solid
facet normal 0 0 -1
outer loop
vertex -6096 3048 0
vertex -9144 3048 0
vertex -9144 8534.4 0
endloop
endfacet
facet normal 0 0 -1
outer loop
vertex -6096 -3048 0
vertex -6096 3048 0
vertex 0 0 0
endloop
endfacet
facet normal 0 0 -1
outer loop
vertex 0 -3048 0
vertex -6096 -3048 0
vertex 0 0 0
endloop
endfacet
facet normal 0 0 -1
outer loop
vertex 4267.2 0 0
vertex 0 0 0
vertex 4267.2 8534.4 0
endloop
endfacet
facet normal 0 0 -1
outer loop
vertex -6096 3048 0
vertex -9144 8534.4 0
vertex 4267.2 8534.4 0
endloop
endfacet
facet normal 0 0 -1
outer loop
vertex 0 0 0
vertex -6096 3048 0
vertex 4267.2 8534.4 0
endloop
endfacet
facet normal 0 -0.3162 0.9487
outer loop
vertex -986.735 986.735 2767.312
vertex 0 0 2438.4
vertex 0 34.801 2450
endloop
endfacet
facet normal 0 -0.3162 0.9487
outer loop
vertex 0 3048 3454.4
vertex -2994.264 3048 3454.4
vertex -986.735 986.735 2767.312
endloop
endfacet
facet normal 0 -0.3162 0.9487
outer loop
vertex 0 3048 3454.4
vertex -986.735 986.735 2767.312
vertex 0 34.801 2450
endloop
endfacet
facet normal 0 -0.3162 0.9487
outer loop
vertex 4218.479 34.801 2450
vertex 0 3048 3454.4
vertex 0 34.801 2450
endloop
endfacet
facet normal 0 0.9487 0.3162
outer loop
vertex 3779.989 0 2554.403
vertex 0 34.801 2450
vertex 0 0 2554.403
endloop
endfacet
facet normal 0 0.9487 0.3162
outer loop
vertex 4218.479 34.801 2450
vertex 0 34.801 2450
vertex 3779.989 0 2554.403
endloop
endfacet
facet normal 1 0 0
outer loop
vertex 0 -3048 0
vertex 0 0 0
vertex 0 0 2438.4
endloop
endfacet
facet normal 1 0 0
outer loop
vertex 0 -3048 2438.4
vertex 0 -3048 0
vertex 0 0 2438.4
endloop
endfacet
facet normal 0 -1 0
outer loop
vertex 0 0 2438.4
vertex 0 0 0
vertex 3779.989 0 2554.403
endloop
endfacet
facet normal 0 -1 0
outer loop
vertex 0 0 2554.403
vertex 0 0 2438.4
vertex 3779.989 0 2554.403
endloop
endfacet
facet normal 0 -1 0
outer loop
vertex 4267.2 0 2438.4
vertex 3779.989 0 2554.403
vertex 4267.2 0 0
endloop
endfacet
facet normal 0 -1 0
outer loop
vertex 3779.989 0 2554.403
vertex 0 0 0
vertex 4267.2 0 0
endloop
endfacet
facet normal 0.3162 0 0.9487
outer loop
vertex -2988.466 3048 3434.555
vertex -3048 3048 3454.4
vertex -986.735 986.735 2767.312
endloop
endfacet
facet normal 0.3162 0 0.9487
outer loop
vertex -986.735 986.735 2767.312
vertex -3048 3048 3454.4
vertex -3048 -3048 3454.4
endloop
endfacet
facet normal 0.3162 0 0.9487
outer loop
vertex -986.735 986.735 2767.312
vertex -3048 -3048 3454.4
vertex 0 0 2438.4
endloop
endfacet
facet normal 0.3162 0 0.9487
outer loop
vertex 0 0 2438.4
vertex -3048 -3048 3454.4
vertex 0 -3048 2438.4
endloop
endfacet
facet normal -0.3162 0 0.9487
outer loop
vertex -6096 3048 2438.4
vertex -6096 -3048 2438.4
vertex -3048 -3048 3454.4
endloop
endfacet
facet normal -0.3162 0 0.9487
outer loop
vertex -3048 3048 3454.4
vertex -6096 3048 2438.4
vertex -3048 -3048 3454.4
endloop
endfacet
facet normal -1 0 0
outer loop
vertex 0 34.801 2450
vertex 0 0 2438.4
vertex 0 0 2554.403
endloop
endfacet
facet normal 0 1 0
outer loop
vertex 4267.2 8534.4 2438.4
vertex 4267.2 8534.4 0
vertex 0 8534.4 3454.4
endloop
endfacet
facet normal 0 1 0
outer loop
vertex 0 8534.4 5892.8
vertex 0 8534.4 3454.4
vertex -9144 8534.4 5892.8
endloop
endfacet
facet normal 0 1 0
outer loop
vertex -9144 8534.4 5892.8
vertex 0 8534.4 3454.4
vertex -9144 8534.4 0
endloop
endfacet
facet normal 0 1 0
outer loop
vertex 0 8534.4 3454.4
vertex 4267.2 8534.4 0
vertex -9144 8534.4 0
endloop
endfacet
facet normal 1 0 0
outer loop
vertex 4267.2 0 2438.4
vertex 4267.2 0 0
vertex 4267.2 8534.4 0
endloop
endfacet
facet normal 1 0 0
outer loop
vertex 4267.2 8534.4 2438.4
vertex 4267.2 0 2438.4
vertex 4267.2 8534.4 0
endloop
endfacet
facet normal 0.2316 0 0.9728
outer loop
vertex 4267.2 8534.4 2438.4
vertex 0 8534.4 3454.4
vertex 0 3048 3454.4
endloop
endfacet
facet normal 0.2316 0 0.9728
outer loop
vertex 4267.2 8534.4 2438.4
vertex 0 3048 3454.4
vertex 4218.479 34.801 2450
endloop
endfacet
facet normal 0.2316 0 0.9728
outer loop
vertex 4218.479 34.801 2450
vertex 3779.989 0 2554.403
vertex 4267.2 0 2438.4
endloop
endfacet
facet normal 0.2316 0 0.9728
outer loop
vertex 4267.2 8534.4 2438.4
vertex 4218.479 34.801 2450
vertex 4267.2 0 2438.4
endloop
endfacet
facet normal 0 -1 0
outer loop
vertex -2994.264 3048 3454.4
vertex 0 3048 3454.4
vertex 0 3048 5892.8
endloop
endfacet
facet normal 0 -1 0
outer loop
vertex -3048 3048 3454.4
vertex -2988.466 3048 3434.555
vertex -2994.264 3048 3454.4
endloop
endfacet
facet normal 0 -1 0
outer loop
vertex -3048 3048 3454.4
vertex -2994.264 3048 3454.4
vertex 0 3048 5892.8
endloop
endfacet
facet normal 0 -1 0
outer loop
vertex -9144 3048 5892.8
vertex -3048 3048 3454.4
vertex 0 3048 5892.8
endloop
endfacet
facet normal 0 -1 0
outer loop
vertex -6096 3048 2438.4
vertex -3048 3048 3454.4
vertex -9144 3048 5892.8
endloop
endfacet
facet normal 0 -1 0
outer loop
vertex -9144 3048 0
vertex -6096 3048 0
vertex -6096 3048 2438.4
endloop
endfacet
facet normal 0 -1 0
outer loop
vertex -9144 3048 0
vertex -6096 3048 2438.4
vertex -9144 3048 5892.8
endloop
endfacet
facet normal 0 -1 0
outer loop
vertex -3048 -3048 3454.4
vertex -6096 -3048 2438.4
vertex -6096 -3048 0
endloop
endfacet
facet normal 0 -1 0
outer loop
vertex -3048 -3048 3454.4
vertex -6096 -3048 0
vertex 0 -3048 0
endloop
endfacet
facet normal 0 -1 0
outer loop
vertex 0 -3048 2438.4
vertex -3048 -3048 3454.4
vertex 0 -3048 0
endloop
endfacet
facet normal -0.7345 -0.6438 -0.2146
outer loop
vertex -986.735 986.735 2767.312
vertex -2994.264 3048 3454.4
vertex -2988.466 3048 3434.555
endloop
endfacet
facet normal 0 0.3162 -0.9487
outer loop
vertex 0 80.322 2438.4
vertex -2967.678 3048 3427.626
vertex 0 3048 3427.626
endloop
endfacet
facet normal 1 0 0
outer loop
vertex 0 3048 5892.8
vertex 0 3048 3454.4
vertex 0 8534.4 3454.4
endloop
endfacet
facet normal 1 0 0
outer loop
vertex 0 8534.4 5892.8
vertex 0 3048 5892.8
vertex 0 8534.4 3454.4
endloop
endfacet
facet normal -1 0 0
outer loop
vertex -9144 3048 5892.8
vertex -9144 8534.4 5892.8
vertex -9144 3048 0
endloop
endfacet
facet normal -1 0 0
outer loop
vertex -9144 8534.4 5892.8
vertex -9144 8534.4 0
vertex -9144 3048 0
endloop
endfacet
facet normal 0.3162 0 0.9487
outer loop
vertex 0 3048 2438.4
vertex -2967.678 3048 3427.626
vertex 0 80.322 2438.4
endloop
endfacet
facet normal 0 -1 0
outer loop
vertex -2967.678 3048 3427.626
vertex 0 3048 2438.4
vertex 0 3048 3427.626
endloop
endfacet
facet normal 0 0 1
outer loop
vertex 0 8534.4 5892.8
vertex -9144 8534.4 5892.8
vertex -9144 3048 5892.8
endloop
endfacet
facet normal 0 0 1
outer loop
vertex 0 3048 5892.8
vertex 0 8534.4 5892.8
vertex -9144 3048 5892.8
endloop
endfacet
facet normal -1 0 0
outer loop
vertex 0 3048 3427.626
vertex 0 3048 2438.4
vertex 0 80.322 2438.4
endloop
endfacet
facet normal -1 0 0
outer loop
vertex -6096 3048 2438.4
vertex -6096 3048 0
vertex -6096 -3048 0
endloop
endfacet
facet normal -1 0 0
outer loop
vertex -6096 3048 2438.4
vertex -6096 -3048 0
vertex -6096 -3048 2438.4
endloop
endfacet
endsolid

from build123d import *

# Parameters (mm, degrees)
F0_W      = 4267.2
F0_H      = 8534.4
F1_DEPTH  = 3454.4
F3_DEPTH  = 12247.14028
F4_W      = 5486.4
F4_H      = 3454.4
F5_DEPTH  = 9144
F6_DEPTH  = 2438.4
F8_W      = 6096
F8_H      = 3454.4
F9_DEPTH  = 6096
F11_DEPTH = 6096
F13_DEPTH = 6096
F16_DEPTH = 25.4
F18_DEPTH = 3511.20794


with BuildPart() as f1:
    # F0 (on Top) → F1 (new body)
    with BuildSketch(Plane.XY):
        with Locations((2133.6, 4267.2)):
            Rectangle(F0_W, F0_H)
    extrude(amount=F1_DEPTH)

    # F2 (on face) → F3 (cut)
    with BuildSketch(Plane.XZ):
        Polygon((0, 3454.4), (4267.2, 2438.4), (4267.2, 3454.4), align=None)
    extrude(amount=-F3_DEPTH, mode=Mode.SUBTRACT)

    # F4 (on face) → F5 (join)
    with BuildSketch(Plane(origin=(0, 0, 0), x_dir=(0, -1, 0), z_dir=(-1, 0, 0))):
        with Locations((-5791.2, 1727.2)):
            Rectangle(F4_W, F4_H)
    extrude(amount=F5_DEPTH)

    # F6 (add): a face of the model
    f6_faces = [f1.faces().sort_by_distance(p)[0] for p in [
        (-4572, 5791.2, 3454.4),
    ]]
    extrude(f6_faces, amount=F6_DEPTH)

    # F8 (on face) → F9 (join)
    with BuildSketch(Plane.XZ.offset(-3048)):
        with Locations((-3048, 1727.2)):
            Rectangle(F8_W, F8_H)
    extrude(amount=F9_DEPTH)

    # F10 (on face) → F11 (cut)
    with BuildSketch(Plane.XZ.offset(3048)):
        Polygon((-6096, 3454.4), (-6096, 2438.4), (-3048, 3454.4), align=None)
    extrude(amount=-F11_DEPTH, mode=Mode.SUBTRACT)

    # F12 (on face) → F13 (cut)
    with BuildSketch(Plane.XZ.offset(3048)):
        Polygon((0, 3454.4), (-3048, 3454.4), (0, 2438.4), align=None)
    extrude(amount=-F13_DEPTH, mode=Mode.SUBTRACT)

    # F15 (on 3pt) → F16 (join)
    with BuildSketch(Plane(origin=(0, -731.52, 2194.56), x_dir=(1, 0, 0), z_dir=(0, -0.316227766, 0.9486832981))):
        Polygon((-2998.1036186218, 3988.1196022034), (0, 743.2488799095), (0, 3988.1196022034), align=None)
    extrude(amount=-F16_DEPTH)

    # F17 (on 3pt) → F18 (cut)
    with BuildSketch(Plane(origin=(0, -731.52, 2194.56), x_dir=(1, 0, 0), z_dir=(0, -0.316227766, 0.9486832981))):
        Polygon((0, 3984.4744205475), (0, 807.7730536461), (4260.7135772705, 807.7730536461), align=None)
    extrude(amount=F18_DEPTH, mode=Mode.SUBTRACT)


solid = f1.part
